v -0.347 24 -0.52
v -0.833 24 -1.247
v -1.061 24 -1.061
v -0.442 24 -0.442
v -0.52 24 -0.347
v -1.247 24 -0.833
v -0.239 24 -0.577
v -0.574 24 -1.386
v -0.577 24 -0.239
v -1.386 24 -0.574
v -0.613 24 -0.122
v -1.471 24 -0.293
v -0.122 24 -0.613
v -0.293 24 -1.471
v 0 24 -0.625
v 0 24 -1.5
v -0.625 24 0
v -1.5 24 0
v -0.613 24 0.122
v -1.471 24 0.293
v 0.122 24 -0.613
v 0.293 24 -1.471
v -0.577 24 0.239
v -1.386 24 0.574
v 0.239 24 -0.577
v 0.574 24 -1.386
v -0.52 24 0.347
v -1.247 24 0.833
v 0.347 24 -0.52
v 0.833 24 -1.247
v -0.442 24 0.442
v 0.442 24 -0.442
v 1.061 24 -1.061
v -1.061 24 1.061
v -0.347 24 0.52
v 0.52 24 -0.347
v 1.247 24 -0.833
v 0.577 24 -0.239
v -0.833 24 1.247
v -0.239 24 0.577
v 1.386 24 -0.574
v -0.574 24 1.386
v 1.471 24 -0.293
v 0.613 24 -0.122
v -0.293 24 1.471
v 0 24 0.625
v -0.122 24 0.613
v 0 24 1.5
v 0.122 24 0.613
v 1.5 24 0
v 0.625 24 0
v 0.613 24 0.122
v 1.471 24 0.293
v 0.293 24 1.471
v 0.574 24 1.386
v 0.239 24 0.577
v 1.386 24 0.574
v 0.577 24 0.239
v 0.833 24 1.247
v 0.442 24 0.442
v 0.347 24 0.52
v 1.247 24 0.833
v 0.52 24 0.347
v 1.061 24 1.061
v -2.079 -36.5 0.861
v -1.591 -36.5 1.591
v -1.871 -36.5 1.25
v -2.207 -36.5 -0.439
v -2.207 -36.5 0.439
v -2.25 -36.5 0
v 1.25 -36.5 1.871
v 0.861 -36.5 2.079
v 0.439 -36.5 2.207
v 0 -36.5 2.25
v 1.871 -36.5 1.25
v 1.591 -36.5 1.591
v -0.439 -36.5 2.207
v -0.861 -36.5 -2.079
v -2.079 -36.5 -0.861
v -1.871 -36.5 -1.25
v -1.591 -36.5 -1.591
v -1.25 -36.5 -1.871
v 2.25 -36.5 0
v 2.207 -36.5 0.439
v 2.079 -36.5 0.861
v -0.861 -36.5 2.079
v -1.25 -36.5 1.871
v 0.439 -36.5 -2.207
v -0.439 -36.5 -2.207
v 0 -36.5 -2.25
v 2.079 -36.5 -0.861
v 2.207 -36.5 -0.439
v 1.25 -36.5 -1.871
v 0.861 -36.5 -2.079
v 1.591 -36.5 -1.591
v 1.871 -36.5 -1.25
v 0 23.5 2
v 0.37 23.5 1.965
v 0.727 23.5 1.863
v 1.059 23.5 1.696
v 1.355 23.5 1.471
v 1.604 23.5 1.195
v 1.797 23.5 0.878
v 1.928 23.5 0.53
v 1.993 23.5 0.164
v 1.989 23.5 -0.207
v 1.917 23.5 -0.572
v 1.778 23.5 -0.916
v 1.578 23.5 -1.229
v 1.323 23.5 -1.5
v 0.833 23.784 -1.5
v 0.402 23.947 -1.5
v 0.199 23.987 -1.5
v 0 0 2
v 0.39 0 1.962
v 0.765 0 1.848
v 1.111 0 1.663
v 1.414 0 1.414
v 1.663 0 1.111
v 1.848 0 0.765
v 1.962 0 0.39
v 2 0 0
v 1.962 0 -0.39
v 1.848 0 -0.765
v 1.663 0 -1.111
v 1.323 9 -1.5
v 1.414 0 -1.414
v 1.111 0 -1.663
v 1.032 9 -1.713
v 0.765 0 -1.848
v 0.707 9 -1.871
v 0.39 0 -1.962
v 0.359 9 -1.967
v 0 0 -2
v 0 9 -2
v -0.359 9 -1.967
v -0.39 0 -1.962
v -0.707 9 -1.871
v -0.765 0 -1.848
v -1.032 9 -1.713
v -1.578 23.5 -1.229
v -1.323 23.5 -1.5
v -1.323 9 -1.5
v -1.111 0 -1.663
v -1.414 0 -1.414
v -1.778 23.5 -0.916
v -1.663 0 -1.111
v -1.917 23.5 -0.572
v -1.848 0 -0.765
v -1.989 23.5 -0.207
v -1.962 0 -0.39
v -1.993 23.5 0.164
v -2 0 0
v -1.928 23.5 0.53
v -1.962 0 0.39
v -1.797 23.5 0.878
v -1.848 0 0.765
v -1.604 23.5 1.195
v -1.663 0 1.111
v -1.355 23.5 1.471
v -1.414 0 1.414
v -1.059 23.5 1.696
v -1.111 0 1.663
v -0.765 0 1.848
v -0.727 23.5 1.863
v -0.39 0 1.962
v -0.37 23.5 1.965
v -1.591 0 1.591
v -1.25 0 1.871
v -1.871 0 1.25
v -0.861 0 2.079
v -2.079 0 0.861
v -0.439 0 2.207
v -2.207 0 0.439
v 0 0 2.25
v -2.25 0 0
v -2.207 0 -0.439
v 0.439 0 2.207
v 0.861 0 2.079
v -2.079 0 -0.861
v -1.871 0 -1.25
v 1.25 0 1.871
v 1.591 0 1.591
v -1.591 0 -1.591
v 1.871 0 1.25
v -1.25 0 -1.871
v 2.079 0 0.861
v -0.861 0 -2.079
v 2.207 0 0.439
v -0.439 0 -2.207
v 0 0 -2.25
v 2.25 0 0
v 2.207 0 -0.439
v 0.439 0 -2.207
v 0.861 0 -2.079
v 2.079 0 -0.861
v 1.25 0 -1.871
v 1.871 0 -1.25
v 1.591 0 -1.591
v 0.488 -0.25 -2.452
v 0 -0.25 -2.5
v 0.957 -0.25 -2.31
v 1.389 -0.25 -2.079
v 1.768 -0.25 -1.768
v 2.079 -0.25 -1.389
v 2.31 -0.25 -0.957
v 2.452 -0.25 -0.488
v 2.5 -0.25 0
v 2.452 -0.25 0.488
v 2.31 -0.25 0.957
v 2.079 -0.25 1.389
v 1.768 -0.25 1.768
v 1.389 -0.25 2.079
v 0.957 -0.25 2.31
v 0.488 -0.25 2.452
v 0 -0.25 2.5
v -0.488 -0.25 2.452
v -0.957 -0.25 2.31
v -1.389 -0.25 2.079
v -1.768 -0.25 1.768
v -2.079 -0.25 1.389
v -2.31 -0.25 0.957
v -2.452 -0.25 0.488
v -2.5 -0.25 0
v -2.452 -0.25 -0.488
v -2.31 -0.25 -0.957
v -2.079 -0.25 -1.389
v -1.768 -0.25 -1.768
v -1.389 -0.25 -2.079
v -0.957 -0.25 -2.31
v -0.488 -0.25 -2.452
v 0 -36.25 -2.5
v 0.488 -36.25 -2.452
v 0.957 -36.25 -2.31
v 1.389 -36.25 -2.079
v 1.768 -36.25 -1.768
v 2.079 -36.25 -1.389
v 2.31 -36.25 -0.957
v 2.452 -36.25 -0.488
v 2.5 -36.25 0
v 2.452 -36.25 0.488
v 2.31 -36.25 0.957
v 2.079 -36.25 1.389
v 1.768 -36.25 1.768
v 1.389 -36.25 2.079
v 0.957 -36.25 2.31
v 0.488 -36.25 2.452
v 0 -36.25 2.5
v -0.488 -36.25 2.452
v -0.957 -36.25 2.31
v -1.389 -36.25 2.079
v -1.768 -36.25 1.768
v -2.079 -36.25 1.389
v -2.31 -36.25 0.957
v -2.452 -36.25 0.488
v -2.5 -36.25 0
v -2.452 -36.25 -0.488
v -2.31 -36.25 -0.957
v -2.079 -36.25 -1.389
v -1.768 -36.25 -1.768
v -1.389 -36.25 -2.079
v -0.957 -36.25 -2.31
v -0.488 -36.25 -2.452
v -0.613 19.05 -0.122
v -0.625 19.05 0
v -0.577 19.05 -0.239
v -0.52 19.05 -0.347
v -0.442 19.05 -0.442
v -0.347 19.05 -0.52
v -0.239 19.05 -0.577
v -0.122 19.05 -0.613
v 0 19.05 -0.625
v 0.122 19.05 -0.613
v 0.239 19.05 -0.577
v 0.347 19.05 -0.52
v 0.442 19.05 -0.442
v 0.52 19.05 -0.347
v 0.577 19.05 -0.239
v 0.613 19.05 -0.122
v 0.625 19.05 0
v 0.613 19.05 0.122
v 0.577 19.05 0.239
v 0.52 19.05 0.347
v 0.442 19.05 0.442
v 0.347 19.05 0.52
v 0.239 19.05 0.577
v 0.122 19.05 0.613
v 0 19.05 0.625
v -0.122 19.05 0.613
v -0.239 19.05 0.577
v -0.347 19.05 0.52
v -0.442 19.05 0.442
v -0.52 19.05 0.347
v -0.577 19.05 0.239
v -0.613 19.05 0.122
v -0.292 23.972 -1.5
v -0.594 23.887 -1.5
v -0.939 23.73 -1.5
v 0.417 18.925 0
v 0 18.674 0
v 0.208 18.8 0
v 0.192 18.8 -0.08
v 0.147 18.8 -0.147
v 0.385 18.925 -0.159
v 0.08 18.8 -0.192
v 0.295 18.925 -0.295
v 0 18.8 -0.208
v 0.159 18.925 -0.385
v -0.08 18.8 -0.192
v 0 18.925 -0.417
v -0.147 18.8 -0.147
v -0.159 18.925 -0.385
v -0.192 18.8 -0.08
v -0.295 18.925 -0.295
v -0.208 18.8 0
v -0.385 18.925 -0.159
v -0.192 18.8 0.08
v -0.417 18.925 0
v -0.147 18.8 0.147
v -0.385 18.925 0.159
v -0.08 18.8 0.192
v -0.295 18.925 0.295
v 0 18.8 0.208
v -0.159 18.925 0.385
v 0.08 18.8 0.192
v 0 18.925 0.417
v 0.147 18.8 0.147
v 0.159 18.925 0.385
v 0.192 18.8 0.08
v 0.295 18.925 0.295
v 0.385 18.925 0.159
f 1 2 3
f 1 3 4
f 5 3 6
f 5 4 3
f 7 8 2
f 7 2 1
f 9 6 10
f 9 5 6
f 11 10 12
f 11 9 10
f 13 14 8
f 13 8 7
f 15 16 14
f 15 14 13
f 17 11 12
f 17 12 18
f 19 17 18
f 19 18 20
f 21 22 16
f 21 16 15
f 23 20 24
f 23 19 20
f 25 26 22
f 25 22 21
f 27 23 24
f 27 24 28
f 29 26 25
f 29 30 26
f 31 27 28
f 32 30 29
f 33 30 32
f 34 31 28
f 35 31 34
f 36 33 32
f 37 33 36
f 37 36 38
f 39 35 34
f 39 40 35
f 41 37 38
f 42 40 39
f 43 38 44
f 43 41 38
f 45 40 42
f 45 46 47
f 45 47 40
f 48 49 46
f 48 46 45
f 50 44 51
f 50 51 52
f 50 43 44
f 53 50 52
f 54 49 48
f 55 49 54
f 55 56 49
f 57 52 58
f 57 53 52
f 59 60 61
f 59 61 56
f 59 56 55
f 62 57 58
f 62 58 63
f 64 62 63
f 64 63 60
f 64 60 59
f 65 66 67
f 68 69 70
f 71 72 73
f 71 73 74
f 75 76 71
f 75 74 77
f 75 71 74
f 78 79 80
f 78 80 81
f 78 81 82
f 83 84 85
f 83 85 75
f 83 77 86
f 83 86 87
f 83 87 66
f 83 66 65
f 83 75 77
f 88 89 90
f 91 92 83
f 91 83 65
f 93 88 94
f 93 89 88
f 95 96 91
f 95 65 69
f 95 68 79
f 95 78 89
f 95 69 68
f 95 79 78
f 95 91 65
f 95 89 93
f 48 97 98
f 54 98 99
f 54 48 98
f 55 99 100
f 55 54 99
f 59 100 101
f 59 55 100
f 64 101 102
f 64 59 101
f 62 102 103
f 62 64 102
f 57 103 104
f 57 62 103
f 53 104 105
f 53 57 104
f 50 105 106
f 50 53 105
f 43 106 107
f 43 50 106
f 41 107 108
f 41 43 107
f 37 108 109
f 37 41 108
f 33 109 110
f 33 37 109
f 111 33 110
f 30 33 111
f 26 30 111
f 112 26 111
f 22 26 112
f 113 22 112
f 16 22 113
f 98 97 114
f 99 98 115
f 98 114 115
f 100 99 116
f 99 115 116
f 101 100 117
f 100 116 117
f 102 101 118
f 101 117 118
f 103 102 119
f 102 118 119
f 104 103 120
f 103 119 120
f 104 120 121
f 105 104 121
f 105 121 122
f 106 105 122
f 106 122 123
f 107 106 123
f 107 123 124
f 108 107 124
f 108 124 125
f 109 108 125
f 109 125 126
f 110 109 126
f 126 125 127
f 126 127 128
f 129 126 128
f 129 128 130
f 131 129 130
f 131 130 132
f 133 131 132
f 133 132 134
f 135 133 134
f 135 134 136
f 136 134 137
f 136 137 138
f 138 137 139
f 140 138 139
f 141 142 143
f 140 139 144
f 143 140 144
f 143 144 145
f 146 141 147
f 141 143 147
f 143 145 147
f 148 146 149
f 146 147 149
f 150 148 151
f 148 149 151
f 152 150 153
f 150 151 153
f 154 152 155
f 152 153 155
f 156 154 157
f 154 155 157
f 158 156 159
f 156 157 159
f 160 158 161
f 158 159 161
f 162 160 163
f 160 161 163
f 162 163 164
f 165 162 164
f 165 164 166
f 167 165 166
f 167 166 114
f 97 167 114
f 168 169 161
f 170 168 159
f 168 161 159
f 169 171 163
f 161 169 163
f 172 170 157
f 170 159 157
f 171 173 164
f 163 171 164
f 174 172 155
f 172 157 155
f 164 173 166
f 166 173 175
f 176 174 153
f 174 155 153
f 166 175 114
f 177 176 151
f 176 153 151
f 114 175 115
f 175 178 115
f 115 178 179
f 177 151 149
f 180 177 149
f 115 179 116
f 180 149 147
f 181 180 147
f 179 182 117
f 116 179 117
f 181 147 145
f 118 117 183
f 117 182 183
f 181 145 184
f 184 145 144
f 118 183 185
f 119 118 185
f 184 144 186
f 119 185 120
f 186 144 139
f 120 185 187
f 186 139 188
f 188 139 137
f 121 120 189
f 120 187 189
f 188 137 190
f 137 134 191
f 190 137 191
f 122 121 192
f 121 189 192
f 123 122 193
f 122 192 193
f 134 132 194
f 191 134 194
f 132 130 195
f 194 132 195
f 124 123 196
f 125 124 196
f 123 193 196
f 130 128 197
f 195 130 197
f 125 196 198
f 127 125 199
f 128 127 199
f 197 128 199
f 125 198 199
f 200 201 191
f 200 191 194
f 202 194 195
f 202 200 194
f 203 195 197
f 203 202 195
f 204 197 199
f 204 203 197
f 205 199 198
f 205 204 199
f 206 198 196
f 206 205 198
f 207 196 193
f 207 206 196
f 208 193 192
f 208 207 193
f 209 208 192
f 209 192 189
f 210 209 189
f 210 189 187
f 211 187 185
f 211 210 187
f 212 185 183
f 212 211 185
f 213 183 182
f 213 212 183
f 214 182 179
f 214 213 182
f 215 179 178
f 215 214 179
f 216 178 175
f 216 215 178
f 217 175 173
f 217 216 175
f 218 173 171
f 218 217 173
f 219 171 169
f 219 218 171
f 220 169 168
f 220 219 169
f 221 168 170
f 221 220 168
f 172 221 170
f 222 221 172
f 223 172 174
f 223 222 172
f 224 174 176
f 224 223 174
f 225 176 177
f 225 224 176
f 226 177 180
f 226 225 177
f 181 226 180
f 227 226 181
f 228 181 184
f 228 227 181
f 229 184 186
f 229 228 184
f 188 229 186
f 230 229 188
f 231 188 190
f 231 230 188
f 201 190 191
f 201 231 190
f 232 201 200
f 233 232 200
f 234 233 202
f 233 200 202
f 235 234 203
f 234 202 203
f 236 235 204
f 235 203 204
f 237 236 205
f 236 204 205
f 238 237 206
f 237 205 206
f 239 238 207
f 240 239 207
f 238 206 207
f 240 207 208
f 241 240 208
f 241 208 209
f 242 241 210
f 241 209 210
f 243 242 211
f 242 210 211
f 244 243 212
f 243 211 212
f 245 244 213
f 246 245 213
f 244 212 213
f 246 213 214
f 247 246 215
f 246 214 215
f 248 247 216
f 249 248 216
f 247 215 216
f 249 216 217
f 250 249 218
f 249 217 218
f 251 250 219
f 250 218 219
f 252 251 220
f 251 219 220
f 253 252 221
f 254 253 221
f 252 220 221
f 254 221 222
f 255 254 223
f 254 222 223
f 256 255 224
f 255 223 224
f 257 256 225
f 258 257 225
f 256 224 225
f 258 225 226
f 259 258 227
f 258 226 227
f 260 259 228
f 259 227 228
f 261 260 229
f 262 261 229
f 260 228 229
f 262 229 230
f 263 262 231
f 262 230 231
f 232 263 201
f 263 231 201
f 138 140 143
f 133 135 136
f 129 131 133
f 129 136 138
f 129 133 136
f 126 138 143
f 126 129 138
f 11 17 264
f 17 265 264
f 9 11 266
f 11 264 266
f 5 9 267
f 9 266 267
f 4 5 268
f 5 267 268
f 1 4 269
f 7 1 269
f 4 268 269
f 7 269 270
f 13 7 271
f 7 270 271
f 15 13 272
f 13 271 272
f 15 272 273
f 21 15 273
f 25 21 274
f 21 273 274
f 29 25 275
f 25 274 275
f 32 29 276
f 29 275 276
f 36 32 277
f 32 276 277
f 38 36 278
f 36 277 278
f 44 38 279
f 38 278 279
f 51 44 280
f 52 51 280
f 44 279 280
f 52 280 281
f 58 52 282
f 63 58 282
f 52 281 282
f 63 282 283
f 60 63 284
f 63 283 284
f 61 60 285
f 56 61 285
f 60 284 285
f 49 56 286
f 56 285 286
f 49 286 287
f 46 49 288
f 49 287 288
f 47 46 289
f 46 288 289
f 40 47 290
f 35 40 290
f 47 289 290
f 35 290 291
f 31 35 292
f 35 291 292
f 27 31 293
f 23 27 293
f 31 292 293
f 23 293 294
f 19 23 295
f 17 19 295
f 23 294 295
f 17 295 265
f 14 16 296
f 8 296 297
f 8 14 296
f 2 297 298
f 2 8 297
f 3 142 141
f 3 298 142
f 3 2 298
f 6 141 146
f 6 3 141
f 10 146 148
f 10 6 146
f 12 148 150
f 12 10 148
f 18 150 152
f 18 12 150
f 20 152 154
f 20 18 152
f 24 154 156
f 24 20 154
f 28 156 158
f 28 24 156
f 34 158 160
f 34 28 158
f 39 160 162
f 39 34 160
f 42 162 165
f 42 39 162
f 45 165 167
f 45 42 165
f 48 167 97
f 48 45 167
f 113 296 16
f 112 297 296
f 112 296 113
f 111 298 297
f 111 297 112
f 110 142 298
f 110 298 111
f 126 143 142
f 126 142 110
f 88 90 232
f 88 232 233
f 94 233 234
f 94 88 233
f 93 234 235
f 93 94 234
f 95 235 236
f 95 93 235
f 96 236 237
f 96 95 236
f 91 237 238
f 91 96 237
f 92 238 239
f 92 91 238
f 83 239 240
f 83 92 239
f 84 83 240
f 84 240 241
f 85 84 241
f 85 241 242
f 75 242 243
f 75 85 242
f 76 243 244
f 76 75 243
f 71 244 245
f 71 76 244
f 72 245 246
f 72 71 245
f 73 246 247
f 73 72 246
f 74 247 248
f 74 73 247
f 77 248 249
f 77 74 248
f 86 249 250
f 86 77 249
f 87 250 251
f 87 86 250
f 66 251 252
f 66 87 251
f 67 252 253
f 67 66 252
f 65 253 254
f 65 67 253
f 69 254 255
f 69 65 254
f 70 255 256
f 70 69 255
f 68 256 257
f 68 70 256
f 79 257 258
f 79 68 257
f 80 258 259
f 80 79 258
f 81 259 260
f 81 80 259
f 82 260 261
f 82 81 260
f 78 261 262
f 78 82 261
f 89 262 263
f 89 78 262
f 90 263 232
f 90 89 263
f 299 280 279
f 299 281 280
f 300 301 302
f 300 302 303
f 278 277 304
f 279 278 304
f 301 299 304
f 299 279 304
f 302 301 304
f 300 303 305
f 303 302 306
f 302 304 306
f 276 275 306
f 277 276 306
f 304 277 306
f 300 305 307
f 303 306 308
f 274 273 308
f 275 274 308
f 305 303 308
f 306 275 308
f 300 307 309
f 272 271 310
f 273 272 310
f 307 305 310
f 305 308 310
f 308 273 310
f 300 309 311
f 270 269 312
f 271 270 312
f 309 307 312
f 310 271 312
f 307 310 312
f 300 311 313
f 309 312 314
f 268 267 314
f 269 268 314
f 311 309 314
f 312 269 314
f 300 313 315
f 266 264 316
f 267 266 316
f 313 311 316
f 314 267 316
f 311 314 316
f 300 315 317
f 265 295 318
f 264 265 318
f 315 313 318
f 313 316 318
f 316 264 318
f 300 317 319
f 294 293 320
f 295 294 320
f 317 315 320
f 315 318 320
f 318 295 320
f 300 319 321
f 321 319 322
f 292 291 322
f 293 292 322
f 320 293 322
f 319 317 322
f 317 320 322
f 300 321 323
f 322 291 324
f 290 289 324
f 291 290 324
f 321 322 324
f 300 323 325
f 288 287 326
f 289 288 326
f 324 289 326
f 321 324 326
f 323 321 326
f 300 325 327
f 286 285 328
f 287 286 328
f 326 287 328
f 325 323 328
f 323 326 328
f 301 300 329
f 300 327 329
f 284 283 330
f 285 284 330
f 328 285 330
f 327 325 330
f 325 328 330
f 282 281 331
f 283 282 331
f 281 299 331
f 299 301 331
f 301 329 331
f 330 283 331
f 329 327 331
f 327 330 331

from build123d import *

# Parameters (mm, degrees)
ESQUISSE1_R             = 2
BOSS_EXTRU_1_DEPTH      = 24
ESQUISSE2_R             = 2.5
BOSS_EXTRU_2_DEPTH      = 36.5
CHANFREIN1_SIZE         = 0.5
TROU_TARAUD_M1_61_D     = 1.25
TROU_TARAUD_M1_61_DEPTH = 4.95
TROU_TARAUD_M1_61_TIP   = 0.375537887
ENL_V_START             = -15
ENL_V_MAT_EXTRU_1_DEPTH = 15
CHANFREIN2_SIZE         = 0.25


with BuildPart() as part:
    # Esquisse1 → Boss.-Extru.1 (new body)
    with BuildSketch(Plane(origin=(0, 0, 0), x_dir=(1, 0, 0), z_dir=(0, 1, 0))):
        with Locations(Location((0, 0, 0), (0, 0, 270))):
            Circle(ESQUISSE1_R)
    extrude(amount=BOSS_EXTRU_1_DEPTH)

    # Esquisse2 → Boss.-Extru.2 (add)
    with BuildSketch(Plane.XZ):
        with Locations(Location((0, 0, 0), (0, 0, 270))):
            Circle(ESQUISSE2_R)
    extrude(amount=BOSS_EXTRU_2_DEPTH)

    # Chanfrein1
    chanfrein1_edges = [part.edges().sort_by_distance(p)[0] for p in [
        (0, 24, -2),
    ]]
    chamfer(chanfrein1_edges, length=CHANFREIN1_SIZE)

    # Trou taraudé M1.61
    with Locations(Plane(origin=(0, 24, 0), x_dir=(1, 0, 0), z_dir=(0, 1, 0))):
        with Locations((0, 0)):
            Hole(TROU_TARAUD_M1_61_D / 2, depth=TROU_TARAUD_M1_61_DEPTH)
            with Locations((0, 0, -(TROU_TARAUD_M1_61_DEPTH + TROU_TARAUD_M1_61_TIP / 2))):  # 118° drill point
                Cone(0, TROU_TARAUD_M1_61_D / 2, TROU_TARAUD_M1_61_TIP, mode=Mode.SUBTRACT)

    # Esquisse5 → Enlèv. mat.-Extru.1 (cut)
    with BuildSketch(Plane(origin=(0, 24, 0), x_dir=(1, 0, 0), z_dir=(0, 1, 0)).offset(ENL_V_START)):
        with BuildLine():
            Line((-1.322875656, 1.5), (1.322875656, 1.5))
            ThreePointArc((1.322875656, 1.5), (0, 2), (-1.322875656, 1.5))
        make_face()
    extrude(amount=ENL_V_MAT_EXTRU_1_DEPTH, mode=Mode.SUBTRACT)

    # Chanfrein2
    chanfrein2_edges = [part.edges().sort_by_distance(p)[0] for p in [
        (0, 0, 2.5),
        (0, -36.5, 2.5),
    ]]
    chamfer(chanfrein2_edges, length=CHANFREIN2_SIZE)


solid = part.part
